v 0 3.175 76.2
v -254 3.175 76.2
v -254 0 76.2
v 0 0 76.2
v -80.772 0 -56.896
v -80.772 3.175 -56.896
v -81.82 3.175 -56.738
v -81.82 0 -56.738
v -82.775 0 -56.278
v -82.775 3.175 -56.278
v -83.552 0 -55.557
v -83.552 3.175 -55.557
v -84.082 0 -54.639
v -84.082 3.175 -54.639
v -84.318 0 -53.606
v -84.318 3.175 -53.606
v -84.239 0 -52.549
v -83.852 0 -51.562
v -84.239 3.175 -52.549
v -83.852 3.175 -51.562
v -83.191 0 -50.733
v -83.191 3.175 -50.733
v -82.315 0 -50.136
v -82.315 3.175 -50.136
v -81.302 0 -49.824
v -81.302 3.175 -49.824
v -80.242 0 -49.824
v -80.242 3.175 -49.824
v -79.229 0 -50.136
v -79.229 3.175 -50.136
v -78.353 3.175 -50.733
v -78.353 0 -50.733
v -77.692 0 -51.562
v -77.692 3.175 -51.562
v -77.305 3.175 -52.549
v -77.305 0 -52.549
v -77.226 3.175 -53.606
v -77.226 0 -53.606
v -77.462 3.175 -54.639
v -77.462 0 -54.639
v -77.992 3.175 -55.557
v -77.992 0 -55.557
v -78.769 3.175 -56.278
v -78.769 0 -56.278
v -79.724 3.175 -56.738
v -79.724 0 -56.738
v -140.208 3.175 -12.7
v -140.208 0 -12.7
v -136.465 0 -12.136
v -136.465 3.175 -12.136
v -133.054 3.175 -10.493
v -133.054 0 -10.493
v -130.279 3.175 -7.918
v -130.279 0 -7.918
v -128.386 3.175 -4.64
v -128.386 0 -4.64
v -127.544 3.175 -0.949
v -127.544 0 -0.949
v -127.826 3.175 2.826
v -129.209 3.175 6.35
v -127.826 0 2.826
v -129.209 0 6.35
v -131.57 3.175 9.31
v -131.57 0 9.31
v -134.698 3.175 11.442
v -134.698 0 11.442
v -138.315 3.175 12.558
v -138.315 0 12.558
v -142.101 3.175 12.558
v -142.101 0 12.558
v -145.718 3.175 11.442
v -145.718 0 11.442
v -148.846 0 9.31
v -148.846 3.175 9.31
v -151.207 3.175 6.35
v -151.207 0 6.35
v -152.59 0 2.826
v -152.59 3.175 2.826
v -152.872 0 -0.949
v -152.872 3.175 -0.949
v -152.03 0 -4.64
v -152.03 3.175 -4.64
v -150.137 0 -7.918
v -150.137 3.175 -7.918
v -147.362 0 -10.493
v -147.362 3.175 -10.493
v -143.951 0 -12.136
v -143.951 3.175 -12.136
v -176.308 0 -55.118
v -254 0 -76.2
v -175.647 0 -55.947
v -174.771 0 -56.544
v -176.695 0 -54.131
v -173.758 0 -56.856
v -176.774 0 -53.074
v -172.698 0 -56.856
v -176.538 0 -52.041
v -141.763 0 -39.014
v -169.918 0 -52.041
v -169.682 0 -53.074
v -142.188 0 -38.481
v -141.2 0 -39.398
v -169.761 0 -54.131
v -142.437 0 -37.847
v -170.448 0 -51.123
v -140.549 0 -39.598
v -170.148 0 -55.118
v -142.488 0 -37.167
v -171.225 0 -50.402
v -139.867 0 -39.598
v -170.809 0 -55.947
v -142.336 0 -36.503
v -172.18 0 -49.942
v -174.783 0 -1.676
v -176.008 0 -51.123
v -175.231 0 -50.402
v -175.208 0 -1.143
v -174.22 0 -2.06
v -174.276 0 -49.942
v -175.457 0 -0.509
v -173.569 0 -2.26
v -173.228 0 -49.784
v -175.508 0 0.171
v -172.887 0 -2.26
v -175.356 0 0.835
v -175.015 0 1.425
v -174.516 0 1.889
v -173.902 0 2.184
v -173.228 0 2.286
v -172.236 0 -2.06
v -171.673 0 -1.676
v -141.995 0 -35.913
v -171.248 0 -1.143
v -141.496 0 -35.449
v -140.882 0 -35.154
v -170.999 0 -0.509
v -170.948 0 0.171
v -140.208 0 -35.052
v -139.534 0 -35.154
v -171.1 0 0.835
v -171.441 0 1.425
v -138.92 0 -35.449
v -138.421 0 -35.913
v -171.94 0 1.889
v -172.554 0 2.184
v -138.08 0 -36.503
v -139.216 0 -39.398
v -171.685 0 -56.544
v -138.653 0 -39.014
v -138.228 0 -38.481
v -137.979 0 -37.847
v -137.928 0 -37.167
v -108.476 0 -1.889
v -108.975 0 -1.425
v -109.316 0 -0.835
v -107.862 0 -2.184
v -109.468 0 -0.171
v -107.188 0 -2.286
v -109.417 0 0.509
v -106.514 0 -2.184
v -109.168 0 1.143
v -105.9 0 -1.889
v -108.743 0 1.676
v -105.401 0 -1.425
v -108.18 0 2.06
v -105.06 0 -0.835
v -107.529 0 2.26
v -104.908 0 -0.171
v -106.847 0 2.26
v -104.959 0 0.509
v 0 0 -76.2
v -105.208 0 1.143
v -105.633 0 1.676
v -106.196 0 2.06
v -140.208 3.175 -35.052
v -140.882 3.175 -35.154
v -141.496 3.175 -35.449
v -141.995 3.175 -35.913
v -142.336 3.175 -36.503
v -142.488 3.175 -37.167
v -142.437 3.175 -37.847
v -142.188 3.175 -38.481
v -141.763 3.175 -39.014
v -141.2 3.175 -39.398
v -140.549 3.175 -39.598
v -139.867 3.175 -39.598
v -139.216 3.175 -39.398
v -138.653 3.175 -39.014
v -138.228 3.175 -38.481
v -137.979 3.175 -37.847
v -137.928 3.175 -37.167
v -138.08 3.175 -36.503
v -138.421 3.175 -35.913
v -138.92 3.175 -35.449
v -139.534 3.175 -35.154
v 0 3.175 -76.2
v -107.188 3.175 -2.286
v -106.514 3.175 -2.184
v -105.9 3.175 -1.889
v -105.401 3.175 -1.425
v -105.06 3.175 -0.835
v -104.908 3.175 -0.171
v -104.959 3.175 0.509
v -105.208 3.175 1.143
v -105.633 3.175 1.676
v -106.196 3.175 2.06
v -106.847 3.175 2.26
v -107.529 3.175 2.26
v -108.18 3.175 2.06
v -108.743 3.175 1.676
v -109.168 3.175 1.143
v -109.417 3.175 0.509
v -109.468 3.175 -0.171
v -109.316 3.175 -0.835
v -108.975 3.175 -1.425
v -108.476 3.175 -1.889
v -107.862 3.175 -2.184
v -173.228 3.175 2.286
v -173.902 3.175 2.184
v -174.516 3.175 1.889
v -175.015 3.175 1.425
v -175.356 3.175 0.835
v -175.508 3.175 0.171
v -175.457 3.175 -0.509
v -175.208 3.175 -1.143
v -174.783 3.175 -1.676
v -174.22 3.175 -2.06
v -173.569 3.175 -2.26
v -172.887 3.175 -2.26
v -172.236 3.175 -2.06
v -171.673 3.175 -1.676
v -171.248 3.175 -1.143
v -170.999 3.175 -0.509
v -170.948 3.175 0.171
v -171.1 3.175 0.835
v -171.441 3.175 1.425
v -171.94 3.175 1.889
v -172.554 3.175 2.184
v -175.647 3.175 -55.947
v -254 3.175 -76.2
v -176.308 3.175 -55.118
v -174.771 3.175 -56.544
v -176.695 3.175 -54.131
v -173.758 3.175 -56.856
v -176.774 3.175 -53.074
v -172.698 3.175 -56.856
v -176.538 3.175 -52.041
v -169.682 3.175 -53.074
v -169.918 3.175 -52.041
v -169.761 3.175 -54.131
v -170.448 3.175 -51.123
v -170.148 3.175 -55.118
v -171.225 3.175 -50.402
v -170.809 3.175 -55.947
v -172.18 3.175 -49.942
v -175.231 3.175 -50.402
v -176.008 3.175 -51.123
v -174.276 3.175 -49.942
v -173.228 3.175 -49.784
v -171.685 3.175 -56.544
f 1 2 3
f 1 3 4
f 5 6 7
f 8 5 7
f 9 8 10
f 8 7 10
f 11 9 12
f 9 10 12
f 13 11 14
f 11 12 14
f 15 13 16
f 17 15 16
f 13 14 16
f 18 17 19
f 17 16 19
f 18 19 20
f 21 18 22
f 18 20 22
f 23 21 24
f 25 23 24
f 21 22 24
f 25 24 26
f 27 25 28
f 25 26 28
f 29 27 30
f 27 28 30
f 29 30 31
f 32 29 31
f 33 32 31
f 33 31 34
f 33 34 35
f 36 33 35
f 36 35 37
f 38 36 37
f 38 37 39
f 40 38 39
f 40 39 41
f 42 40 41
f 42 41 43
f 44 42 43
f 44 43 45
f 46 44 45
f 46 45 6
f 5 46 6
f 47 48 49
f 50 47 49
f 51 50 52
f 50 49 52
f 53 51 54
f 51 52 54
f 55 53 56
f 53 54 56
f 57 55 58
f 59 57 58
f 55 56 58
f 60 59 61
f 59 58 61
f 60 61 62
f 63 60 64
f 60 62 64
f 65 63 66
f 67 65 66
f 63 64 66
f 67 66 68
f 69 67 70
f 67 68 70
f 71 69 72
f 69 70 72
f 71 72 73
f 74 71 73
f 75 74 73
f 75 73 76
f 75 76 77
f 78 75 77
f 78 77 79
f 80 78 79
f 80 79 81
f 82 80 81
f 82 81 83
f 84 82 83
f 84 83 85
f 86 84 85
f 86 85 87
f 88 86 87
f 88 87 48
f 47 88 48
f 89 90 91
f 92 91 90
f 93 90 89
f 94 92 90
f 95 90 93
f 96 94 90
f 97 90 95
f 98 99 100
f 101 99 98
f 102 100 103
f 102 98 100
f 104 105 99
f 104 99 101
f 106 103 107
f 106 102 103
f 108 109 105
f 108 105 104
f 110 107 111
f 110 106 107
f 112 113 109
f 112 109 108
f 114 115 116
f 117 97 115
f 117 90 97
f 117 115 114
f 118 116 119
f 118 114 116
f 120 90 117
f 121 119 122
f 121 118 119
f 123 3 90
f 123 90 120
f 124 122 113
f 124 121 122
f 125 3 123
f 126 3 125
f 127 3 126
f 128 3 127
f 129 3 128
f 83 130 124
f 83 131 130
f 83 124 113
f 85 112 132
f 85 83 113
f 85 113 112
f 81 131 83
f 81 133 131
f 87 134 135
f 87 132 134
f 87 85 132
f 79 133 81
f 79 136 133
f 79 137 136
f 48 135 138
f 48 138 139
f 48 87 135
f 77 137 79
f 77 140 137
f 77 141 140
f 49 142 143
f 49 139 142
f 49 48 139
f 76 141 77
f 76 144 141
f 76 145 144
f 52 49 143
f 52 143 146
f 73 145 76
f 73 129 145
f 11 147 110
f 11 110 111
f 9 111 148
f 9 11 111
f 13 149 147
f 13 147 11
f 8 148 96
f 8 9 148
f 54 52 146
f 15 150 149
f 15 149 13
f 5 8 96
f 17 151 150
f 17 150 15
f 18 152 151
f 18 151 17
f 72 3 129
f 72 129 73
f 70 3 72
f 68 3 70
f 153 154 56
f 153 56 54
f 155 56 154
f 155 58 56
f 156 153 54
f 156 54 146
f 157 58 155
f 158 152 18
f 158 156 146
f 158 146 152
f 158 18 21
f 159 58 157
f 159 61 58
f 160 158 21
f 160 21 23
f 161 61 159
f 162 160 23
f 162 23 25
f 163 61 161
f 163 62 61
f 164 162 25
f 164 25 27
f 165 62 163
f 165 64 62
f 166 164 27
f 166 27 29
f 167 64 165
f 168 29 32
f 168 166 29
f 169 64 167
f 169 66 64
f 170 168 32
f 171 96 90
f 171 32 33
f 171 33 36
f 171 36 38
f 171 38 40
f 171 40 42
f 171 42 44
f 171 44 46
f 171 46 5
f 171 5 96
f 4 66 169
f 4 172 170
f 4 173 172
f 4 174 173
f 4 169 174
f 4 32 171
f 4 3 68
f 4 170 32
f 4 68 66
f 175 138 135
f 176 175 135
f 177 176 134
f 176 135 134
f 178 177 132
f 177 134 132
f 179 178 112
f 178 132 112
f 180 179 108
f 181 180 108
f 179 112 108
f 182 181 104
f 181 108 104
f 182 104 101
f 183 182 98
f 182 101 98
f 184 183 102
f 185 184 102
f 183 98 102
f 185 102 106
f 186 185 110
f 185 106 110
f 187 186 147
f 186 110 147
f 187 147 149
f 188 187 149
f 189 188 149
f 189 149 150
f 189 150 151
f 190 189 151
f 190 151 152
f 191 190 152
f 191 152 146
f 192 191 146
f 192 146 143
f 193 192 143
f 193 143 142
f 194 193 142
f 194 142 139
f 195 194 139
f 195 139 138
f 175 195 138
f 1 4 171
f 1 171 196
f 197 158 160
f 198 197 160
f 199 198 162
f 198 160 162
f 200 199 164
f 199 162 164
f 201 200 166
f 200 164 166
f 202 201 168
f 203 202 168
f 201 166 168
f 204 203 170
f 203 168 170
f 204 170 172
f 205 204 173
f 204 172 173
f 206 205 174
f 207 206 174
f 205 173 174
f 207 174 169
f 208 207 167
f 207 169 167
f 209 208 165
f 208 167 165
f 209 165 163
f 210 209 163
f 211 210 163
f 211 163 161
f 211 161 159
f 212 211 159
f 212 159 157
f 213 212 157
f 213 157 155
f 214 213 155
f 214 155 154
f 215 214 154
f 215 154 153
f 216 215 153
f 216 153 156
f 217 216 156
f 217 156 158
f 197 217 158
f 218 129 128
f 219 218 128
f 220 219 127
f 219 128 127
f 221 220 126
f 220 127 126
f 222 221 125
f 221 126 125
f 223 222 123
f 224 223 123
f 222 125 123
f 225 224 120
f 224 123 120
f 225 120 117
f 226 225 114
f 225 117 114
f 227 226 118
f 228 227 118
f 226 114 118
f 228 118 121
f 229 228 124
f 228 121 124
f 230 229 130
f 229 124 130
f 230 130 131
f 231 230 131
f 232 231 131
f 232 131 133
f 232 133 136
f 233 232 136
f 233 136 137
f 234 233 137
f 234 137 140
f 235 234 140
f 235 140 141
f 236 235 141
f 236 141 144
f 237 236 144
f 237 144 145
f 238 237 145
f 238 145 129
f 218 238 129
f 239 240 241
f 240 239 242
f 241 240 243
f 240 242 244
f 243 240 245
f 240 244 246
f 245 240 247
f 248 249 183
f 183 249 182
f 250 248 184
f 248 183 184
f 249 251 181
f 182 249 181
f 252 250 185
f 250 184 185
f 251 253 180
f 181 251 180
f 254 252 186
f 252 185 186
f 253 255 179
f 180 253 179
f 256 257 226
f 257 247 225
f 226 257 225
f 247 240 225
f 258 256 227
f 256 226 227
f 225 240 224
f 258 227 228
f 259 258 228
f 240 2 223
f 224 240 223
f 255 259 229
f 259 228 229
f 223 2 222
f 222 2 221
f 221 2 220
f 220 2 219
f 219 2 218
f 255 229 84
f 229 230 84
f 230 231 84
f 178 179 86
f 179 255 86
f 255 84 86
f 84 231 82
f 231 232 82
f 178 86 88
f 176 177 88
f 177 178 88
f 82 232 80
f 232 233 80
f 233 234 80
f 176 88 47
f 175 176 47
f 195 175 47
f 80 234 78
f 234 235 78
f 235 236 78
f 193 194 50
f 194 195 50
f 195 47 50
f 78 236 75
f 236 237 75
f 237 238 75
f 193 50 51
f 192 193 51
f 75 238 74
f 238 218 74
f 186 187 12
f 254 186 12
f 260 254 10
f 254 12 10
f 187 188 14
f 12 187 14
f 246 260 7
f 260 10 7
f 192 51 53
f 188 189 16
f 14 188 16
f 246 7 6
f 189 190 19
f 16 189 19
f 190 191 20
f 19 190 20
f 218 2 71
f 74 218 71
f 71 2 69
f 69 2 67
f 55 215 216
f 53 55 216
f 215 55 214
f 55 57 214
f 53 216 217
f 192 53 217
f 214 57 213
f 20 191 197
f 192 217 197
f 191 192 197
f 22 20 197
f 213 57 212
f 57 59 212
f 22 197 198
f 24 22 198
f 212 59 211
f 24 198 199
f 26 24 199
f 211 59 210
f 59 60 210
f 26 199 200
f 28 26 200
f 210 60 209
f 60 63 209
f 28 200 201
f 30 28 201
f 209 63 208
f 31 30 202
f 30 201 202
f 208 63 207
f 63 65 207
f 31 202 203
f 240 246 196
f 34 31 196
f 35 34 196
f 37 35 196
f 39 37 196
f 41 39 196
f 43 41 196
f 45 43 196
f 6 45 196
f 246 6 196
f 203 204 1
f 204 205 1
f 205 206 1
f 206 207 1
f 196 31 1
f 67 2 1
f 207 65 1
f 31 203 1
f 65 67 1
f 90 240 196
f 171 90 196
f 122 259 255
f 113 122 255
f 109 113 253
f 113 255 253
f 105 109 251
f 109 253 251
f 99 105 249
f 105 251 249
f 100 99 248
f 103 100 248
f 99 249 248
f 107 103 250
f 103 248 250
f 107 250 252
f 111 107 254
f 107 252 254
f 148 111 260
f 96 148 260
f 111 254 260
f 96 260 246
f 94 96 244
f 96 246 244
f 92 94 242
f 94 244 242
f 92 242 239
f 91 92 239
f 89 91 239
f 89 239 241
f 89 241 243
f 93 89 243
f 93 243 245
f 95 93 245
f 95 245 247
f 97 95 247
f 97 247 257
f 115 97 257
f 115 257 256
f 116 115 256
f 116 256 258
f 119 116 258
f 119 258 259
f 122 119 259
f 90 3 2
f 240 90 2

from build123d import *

# Parameters (mm, degrees)
SKETCH1_W          = 254
SKETCH1_H          = 3.175
BASE_FLANGE1_DEPTH = 76.2
SKETCH6_R          = 12.7
CUT_EXTRUDE1_DEPTH = 266.202791511
SKETCH7_R          = 2.286
CUT_EXTRUDE2_DEPTH = 266.202791511
SKETCH8_R          = 2.286
CUT_EXTRUDE3_DEPTH = 266.202791511
SKETCH9_R          = 3.556
CUT_EXTRUDE4_DEPTH = 266.202791511


# Sheet-metal steps are written as plain solids
with BuildPart() as part:
    # Sketch1 → Base-Flange1 (new, symmetric)
    with BuildSketch(Plane.XY):
        with Locations((-127, 1.5875)):
            Rectangle(SKETCH1_W, SKETCH1_H)
    extrude(amount=BASE_FLANGE1_DEPTH, both=True)

    # Sketch6 → Cut-Extrude1 (cut, through all)
    with BuildSketch(Plane.XZ):
        with Locations(Location((-140.208, 0, 0), (0, 0, 270))):
            Circle(SKETCH6_R)
    extrude(amount=-CUT_EXTRUDE1_DEPTH, mode=Mode.SUBTRACT)

    # Sketch7 → Cut-Extrude2 (cut, through all)
    with BuildSketch(Plane.XZ):
        with Locations(Location((-107.188, 0, 0), (0, 0, 270))):
            Circle(SKETCH7_R)
        with Locations(Location((-173.228, 0, 0), (0, 0, 90))):
            Circle(SKETCH7_R)
    extrude(amount=-CUT_EXTRUDE2_DEPTH, mode=Mode.SUBTRACT)

    # Sketch8 → Cut-Extrude3 (cut, through all)
    with BuildSketch(Plane.XZ):
        with Locations(Location((-140.208, -37.338, 0), (0, 0, 90))):
            Circle(SKETCH8_R)
    extrude(amount=-CUT_EXTRUDE3_DEPTH, mode=Mode.SUBTRACT)

    # Sketch9 → Cut-Extrude4 (cut, through all)
    with BuildSketch(Plane(origin=(0, 3.175, 0), x_dir=(1, 0, 0), z_dir=(0, 1, 0))):
        with Locations(Location((-173.228, 53.34, 0), (0, 0, 270))):
            Circle(SKETCH9_R)
        with Locations(Location((-80.772, 53.34, 0), (0, 0, 90))):
            Circle(SKETCH9_R)
    extrude(amount=-CUT_EXTRUDE4_DEPTH, mode=Mode.SUBTRACT)


solid = part.part
